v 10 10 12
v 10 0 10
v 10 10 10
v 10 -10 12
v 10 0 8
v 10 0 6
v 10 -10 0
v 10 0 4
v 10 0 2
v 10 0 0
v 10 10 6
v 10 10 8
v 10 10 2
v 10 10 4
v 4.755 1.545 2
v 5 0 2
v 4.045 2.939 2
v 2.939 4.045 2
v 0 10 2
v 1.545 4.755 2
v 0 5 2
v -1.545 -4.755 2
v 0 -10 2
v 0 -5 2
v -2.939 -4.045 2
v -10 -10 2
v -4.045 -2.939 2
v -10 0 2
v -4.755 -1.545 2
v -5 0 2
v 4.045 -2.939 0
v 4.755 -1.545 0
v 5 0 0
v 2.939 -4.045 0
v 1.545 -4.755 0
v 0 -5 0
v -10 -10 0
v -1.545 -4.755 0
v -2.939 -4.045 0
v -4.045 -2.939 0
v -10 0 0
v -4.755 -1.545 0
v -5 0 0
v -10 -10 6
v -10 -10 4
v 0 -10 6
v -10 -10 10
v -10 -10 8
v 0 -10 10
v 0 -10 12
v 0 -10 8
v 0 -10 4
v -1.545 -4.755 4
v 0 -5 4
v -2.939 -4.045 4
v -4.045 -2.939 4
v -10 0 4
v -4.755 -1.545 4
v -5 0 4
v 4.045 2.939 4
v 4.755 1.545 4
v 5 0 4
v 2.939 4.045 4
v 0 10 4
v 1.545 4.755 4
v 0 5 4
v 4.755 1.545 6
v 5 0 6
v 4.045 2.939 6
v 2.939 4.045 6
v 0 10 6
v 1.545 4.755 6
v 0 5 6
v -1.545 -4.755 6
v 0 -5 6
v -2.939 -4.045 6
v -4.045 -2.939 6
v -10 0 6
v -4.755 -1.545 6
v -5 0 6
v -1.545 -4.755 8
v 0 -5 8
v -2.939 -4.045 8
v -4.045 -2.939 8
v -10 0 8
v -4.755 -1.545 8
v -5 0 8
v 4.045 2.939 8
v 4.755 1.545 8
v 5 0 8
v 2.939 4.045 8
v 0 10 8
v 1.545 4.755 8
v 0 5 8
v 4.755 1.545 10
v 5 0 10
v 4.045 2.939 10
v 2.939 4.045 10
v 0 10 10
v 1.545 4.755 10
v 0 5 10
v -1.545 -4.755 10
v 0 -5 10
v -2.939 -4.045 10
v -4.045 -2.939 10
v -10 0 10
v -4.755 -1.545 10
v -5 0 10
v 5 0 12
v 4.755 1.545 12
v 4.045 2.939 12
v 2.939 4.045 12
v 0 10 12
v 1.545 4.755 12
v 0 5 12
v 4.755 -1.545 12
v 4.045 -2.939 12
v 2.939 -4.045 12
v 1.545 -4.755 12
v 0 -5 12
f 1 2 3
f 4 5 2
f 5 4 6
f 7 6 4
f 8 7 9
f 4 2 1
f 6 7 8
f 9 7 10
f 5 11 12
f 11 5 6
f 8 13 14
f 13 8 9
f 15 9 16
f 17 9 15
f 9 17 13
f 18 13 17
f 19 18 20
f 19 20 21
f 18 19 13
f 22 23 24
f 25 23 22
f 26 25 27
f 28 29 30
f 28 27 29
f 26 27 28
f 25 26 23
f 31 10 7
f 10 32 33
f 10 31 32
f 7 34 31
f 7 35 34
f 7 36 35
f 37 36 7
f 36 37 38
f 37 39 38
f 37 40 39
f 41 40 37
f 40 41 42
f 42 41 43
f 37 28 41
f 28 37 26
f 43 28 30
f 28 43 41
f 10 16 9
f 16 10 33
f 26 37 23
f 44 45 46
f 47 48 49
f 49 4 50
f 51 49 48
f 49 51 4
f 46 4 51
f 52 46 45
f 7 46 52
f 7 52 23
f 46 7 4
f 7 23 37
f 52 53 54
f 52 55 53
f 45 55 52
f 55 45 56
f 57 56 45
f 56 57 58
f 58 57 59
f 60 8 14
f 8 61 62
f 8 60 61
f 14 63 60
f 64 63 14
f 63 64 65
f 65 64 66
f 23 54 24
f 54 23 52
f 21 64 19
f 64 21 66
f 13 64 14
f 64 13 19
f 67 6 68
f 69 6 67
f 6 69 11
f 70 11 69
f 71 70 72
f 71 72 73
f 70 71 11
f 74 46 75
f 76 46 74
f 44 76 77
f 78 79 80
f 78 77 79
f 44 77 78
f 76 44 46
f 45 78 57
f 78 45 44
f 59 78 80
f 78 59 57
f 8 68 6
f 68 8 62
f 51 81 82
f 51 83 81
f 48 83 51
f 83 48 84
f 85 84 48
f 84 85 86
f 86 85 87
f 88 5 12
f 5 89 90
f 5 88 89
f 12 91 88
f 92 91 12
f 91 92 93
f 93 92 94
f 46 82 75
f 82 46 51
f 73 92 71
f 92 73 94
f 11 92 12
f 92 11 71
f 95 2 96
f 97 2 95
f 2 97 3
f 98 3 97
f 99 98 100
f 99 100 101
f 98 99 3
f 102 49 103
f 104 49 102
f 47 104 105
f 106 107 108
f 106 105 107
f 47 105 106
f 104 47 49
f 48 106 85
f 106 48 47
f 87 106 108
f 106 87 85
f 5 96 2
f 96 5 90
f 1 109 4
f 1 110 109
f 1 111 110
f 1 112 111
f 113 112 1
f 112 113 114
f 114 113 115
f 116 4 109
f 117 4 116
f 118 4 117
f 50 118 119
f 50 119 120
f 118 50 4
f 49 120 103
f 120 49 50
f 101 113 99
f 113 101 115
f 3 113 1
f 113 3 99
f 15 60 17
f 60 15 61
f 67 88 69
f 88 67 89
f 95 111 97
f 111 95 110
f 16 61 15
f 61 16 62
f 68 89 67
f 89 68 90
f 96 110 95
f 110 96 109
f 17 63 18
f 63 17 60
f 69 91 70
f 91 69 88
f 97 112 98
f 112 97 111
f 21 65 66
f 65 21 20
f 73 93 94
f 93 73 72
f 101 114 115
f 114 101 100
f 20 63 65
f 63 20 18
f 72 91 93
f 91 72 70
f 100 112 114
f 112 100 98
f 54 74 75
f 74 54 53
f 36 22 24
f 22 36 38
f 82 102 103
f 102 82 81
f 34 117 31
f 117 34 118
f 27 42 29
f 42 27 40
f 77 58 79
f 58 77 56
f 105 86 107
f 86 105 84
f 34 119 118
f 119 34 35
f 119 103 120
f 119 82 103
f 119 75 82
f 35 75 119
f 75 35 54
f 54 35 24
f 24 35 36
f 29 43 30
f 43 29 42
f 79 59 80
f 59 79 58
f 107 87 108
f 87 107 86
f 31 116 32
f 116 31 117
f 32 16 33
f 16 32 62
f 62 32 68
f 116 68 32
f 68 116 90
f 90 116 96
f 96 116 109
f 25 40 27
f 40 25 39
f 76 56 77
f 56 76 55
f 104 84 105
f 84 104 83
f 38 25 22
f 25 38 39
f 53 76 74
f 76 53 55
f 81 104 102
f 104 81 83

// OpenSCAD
//dual extruder test
$fn=20;

size = 20;

yellow = 1;
blue = 0;


difference()
{
    union()
    {
        layer(0);
        rotate([0,0,90])
        layer(2);
        rotate([0,0,0])
        layer(4);
        rotate([0,0,90])
        layer(6);
        rotate([0,0,0])
        layer(8);
        rotate([0,0,90])
        layer(10);
    }
    translate([0,0,-1])
    cylinder(r=size/4, h=14);
}

module layer(z = 0)
{
    translate([-size/2,-size/2,z])
    {
        if (yellow==1)
        {
            color ("yellow") 
            {
                part();
            }
        }
        
        if (blue == 1)
        {
            color ("blue") 
            {	
                translate([0,size/2,0])
                    part();
            }
        }
    }
}

module part()
{
    cube([size,size/2,2]);
}
